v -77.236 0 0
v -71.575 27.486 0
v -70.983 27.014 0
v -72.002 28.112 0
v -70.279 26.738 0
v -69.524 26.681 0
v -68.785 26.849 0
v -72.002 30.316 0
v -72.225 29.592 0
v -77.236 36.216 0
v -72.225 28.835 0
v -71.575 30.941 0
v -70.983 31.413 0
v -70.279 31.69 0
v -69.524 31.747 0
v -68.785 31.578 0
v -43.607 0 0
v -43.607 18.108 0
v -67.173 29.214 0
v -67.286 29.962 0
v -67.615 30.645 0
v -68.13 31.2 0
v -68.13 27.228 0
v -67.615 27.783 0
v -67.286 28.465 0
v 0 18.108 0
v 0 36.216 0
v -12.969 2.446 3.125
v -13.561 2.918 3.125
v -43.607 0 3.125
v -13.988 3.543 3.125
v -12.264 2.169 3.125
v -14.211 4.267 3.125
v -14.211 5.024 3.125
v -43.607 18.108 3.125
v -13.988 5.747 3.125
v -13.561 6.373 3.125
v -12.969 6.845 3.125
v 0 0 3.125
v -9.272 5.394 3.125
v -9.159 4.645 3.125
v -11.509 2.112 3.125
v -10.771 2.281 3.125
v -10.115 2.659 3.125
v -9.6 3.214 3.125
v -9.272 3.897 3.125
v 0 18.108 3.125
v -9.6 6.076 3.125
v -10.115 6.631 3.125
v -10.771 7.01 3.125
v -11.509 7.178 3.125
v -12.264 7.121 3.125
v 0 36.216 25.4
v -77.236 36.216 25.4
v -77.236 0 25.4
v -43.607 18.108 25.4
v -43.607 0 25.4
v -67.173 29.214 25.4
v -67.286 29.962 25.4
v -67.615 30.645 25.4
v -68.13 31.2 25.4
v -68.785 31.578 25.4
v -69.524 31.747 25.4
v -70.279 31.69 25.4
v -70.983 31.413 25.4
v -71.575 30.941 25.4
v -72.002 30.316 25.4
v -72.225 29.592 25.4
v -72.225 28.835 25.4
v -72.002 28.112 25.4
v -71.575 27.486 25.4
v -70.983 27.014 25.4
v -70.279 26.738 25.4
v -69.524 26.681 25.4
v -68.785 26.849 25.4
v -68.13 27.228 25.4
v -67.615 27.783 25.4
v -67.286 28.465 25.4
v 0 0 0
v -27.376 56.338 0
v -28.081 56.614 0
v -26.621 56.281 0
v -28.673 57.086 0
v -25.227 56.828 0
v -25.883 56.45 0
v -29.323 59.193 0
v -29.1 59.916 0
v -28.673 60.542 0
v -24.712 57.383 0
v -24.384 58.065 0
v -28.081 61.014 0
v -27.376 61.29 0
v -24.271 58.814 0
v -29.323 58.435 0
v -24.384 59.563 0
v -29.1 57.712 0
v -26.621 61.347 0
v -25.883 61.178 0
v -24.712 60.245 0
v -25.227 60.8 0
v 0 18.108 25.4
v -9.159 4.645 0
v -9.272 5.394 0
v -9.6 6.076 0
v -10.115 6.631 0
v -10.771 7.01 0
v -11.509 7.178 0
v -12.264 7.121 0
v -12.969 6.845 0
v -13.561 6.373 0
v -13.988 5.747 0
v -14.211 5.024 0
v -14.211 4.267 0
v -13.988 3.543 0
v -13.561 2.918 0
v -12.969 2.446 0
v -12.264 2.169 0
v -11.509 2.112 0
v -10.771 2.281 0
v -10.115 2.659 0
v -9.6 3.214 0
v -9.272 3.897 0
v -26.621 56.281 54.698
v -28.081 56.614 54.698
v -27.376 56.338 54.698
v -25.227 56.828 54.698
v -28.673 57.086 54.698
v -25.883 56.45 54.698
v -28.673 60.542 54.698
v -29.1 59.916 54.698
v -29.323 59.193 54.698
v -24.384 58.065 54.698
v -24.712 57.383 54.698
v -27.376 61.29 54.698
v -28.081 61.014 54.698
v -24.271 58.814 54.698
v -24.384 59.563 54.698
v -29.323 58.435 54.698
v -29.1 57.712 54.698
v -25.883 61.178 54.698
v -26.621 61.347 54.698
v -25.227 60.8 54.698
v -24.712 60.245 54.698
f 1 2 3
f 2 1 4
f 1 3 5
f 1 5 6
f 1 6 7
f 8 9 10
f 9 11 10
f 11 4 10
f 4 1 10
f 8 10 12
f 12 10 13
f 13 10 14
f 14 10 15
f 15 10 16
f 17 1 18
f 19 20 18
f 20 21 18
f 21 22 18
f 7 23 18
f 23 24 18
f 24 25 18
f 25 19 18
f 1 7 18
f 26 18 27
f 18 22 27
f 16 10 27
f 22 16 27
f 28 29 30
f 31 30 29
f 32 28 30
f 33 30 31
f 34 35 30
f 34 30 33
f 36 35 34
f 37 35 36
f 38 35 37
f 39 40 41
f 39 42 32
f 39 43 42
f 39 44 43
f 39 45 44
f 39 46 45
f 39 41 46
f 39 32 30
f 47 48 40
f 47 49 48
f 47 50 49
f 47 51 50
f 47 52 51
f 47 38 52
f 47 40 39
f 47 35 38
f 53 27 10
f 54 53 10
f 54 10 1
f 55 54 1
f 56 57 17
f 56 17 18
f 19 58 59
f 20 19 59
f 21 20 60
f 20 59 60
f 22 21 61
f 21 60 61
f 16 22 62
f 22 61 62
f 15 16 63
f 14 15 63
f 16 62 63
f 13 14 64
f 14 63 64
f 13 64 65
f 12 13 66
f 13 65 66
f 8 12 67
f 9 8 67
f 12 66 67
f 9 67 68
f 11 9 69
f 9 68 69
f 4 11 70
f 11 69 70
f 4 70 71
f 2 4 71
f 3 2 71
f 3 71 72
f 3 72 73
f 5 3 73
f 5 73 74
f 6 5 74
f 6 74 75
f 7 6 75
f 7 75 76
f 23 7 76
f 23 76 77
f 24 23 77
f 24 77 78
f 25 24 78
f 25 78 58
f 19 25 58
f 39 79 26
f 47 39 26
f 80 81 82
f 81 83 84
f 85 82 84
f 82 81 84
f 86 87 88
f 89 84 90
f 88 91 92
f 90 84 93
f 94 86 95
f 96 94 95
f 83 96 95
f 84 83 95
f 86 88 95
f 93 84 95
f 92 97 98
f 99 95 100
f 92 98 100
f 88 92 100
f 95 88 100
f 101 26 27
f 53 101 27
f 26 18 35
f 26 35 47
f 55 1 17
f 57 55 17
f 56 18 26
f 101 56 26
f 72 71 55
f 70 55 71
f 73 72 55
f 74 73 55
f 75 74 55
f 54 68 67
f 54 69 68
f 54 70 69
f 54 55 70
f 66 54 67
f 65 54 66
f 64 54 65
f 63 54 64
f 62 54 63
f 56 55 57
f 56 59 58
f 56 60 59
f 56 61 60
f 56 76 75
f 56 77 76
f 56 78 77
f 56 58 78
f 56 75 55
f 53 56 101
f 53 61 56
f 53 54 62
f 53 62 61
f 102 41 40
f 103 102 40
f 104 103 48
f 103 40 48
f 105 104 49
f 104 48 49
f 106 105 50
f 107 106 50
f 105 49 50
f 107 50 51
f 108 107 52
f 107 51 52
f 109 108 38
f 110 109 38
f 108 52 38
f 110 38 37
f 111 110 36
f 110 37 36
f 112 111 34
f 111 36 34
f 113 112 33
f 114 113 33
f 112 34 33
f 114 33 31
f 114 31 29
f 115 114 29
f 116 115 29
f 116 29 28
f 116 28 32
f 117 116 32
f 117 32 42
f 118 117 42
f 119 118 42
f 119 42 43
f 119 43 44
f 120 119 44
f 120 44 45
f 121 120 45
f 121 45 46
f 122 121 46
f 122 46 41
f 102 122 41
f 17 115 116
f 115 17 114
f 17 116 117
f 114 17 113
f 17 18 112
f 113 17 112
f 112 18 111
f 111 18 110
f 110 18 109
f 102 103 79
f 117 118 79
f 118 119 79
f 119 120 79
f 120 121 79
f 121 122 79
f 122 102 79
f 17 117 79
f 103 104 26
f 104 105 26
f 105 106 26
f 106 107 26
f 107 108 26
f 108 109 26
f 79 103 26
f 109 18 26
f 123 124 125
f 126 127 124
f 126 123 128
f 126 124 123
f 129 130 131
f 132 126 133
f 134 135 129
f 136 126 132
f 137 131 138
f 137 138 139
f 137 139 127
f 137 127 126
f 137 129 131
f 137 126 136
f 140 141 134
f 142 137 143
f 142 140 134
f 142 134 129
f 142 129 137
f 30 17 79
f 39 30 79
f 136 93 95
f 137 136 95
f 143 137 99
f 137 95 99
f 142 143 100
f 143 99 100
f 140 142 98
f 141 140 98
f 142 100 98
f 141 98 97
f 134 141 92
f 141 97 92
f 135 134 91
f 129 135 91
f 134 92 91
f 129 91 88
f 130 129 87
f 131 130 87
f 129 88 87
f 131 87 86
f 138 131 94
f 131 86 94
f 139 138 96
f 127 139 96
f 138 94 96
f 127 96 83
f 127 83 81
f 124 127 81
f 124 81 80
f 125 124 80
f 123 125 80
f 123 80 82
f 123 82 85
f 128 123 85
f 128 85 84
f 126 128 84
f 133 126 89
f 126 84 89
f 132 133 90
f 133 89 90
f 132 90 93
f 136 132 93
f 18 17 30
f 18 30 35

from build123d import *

# Parameters (mm, degrees)
F1_DEPTH = 25.4
F0_W     = 43.606944
F0_H     = 18.107958
F2_DEPTH = 3.12498
F5_R     = 2.539963
F6_DEPTH = 54.698341
F4_R     = 2.539963
F7_DEPTH = 47.644243
F3_R     = 2.539963
F8_DEPTH = 52.474499


with BuildPart() as f1:
    # F0 (on Top) → F1 (new body)
    with BuildSketch(Plane.XY):
        Polygon((-77.236027, 0), (-43.606944, 0), (-43.606944, 18.107958), (0, 18.107958), (0, 36.215916), (-77.236027, 36.215916), align=None)
    extrude(amount=F1_DEPTH)

    # F3 (on face) → F8 (cut)
    with BuildSketch(Plane.XY.offset(25.4)):
        with Locations((-69.713354, 29.213805)):
            Circle(F3_R)
    extrude(amount=-F8_DEPTH, mode=Mode.SUBTRACT)


with BuildPart() as f2:
    # F0 (on Top) → F2 (new body)
    with BuildSketch(Plane.XY):
        with Locations((-21.803472, 9.053979)):
            Rectangle(F0_W, F0_H)
    extrude(amount=F2_DEPTH)

    # F4 (on face) → F7 (cut)
    with BuildSketch(Plane.XY.offset(25.4)):
        with Locations((-11.699114, 4.645208)):
            Circle(F4_R)
    extrude(amount=-F7_DEPTH, mode=Mode.SUBTRACT)


with BuildPart() as f6:
    # F5 (on Top) → F6 (new body)
    with BuildSketch(Plane.XY):
        with Locations((-26.811084, 58.814038)):
            Circle(F5_R)
    extrude(amount=F6_DEPTH)


solid = Compound([f1.part, f2.part, f6.part])
